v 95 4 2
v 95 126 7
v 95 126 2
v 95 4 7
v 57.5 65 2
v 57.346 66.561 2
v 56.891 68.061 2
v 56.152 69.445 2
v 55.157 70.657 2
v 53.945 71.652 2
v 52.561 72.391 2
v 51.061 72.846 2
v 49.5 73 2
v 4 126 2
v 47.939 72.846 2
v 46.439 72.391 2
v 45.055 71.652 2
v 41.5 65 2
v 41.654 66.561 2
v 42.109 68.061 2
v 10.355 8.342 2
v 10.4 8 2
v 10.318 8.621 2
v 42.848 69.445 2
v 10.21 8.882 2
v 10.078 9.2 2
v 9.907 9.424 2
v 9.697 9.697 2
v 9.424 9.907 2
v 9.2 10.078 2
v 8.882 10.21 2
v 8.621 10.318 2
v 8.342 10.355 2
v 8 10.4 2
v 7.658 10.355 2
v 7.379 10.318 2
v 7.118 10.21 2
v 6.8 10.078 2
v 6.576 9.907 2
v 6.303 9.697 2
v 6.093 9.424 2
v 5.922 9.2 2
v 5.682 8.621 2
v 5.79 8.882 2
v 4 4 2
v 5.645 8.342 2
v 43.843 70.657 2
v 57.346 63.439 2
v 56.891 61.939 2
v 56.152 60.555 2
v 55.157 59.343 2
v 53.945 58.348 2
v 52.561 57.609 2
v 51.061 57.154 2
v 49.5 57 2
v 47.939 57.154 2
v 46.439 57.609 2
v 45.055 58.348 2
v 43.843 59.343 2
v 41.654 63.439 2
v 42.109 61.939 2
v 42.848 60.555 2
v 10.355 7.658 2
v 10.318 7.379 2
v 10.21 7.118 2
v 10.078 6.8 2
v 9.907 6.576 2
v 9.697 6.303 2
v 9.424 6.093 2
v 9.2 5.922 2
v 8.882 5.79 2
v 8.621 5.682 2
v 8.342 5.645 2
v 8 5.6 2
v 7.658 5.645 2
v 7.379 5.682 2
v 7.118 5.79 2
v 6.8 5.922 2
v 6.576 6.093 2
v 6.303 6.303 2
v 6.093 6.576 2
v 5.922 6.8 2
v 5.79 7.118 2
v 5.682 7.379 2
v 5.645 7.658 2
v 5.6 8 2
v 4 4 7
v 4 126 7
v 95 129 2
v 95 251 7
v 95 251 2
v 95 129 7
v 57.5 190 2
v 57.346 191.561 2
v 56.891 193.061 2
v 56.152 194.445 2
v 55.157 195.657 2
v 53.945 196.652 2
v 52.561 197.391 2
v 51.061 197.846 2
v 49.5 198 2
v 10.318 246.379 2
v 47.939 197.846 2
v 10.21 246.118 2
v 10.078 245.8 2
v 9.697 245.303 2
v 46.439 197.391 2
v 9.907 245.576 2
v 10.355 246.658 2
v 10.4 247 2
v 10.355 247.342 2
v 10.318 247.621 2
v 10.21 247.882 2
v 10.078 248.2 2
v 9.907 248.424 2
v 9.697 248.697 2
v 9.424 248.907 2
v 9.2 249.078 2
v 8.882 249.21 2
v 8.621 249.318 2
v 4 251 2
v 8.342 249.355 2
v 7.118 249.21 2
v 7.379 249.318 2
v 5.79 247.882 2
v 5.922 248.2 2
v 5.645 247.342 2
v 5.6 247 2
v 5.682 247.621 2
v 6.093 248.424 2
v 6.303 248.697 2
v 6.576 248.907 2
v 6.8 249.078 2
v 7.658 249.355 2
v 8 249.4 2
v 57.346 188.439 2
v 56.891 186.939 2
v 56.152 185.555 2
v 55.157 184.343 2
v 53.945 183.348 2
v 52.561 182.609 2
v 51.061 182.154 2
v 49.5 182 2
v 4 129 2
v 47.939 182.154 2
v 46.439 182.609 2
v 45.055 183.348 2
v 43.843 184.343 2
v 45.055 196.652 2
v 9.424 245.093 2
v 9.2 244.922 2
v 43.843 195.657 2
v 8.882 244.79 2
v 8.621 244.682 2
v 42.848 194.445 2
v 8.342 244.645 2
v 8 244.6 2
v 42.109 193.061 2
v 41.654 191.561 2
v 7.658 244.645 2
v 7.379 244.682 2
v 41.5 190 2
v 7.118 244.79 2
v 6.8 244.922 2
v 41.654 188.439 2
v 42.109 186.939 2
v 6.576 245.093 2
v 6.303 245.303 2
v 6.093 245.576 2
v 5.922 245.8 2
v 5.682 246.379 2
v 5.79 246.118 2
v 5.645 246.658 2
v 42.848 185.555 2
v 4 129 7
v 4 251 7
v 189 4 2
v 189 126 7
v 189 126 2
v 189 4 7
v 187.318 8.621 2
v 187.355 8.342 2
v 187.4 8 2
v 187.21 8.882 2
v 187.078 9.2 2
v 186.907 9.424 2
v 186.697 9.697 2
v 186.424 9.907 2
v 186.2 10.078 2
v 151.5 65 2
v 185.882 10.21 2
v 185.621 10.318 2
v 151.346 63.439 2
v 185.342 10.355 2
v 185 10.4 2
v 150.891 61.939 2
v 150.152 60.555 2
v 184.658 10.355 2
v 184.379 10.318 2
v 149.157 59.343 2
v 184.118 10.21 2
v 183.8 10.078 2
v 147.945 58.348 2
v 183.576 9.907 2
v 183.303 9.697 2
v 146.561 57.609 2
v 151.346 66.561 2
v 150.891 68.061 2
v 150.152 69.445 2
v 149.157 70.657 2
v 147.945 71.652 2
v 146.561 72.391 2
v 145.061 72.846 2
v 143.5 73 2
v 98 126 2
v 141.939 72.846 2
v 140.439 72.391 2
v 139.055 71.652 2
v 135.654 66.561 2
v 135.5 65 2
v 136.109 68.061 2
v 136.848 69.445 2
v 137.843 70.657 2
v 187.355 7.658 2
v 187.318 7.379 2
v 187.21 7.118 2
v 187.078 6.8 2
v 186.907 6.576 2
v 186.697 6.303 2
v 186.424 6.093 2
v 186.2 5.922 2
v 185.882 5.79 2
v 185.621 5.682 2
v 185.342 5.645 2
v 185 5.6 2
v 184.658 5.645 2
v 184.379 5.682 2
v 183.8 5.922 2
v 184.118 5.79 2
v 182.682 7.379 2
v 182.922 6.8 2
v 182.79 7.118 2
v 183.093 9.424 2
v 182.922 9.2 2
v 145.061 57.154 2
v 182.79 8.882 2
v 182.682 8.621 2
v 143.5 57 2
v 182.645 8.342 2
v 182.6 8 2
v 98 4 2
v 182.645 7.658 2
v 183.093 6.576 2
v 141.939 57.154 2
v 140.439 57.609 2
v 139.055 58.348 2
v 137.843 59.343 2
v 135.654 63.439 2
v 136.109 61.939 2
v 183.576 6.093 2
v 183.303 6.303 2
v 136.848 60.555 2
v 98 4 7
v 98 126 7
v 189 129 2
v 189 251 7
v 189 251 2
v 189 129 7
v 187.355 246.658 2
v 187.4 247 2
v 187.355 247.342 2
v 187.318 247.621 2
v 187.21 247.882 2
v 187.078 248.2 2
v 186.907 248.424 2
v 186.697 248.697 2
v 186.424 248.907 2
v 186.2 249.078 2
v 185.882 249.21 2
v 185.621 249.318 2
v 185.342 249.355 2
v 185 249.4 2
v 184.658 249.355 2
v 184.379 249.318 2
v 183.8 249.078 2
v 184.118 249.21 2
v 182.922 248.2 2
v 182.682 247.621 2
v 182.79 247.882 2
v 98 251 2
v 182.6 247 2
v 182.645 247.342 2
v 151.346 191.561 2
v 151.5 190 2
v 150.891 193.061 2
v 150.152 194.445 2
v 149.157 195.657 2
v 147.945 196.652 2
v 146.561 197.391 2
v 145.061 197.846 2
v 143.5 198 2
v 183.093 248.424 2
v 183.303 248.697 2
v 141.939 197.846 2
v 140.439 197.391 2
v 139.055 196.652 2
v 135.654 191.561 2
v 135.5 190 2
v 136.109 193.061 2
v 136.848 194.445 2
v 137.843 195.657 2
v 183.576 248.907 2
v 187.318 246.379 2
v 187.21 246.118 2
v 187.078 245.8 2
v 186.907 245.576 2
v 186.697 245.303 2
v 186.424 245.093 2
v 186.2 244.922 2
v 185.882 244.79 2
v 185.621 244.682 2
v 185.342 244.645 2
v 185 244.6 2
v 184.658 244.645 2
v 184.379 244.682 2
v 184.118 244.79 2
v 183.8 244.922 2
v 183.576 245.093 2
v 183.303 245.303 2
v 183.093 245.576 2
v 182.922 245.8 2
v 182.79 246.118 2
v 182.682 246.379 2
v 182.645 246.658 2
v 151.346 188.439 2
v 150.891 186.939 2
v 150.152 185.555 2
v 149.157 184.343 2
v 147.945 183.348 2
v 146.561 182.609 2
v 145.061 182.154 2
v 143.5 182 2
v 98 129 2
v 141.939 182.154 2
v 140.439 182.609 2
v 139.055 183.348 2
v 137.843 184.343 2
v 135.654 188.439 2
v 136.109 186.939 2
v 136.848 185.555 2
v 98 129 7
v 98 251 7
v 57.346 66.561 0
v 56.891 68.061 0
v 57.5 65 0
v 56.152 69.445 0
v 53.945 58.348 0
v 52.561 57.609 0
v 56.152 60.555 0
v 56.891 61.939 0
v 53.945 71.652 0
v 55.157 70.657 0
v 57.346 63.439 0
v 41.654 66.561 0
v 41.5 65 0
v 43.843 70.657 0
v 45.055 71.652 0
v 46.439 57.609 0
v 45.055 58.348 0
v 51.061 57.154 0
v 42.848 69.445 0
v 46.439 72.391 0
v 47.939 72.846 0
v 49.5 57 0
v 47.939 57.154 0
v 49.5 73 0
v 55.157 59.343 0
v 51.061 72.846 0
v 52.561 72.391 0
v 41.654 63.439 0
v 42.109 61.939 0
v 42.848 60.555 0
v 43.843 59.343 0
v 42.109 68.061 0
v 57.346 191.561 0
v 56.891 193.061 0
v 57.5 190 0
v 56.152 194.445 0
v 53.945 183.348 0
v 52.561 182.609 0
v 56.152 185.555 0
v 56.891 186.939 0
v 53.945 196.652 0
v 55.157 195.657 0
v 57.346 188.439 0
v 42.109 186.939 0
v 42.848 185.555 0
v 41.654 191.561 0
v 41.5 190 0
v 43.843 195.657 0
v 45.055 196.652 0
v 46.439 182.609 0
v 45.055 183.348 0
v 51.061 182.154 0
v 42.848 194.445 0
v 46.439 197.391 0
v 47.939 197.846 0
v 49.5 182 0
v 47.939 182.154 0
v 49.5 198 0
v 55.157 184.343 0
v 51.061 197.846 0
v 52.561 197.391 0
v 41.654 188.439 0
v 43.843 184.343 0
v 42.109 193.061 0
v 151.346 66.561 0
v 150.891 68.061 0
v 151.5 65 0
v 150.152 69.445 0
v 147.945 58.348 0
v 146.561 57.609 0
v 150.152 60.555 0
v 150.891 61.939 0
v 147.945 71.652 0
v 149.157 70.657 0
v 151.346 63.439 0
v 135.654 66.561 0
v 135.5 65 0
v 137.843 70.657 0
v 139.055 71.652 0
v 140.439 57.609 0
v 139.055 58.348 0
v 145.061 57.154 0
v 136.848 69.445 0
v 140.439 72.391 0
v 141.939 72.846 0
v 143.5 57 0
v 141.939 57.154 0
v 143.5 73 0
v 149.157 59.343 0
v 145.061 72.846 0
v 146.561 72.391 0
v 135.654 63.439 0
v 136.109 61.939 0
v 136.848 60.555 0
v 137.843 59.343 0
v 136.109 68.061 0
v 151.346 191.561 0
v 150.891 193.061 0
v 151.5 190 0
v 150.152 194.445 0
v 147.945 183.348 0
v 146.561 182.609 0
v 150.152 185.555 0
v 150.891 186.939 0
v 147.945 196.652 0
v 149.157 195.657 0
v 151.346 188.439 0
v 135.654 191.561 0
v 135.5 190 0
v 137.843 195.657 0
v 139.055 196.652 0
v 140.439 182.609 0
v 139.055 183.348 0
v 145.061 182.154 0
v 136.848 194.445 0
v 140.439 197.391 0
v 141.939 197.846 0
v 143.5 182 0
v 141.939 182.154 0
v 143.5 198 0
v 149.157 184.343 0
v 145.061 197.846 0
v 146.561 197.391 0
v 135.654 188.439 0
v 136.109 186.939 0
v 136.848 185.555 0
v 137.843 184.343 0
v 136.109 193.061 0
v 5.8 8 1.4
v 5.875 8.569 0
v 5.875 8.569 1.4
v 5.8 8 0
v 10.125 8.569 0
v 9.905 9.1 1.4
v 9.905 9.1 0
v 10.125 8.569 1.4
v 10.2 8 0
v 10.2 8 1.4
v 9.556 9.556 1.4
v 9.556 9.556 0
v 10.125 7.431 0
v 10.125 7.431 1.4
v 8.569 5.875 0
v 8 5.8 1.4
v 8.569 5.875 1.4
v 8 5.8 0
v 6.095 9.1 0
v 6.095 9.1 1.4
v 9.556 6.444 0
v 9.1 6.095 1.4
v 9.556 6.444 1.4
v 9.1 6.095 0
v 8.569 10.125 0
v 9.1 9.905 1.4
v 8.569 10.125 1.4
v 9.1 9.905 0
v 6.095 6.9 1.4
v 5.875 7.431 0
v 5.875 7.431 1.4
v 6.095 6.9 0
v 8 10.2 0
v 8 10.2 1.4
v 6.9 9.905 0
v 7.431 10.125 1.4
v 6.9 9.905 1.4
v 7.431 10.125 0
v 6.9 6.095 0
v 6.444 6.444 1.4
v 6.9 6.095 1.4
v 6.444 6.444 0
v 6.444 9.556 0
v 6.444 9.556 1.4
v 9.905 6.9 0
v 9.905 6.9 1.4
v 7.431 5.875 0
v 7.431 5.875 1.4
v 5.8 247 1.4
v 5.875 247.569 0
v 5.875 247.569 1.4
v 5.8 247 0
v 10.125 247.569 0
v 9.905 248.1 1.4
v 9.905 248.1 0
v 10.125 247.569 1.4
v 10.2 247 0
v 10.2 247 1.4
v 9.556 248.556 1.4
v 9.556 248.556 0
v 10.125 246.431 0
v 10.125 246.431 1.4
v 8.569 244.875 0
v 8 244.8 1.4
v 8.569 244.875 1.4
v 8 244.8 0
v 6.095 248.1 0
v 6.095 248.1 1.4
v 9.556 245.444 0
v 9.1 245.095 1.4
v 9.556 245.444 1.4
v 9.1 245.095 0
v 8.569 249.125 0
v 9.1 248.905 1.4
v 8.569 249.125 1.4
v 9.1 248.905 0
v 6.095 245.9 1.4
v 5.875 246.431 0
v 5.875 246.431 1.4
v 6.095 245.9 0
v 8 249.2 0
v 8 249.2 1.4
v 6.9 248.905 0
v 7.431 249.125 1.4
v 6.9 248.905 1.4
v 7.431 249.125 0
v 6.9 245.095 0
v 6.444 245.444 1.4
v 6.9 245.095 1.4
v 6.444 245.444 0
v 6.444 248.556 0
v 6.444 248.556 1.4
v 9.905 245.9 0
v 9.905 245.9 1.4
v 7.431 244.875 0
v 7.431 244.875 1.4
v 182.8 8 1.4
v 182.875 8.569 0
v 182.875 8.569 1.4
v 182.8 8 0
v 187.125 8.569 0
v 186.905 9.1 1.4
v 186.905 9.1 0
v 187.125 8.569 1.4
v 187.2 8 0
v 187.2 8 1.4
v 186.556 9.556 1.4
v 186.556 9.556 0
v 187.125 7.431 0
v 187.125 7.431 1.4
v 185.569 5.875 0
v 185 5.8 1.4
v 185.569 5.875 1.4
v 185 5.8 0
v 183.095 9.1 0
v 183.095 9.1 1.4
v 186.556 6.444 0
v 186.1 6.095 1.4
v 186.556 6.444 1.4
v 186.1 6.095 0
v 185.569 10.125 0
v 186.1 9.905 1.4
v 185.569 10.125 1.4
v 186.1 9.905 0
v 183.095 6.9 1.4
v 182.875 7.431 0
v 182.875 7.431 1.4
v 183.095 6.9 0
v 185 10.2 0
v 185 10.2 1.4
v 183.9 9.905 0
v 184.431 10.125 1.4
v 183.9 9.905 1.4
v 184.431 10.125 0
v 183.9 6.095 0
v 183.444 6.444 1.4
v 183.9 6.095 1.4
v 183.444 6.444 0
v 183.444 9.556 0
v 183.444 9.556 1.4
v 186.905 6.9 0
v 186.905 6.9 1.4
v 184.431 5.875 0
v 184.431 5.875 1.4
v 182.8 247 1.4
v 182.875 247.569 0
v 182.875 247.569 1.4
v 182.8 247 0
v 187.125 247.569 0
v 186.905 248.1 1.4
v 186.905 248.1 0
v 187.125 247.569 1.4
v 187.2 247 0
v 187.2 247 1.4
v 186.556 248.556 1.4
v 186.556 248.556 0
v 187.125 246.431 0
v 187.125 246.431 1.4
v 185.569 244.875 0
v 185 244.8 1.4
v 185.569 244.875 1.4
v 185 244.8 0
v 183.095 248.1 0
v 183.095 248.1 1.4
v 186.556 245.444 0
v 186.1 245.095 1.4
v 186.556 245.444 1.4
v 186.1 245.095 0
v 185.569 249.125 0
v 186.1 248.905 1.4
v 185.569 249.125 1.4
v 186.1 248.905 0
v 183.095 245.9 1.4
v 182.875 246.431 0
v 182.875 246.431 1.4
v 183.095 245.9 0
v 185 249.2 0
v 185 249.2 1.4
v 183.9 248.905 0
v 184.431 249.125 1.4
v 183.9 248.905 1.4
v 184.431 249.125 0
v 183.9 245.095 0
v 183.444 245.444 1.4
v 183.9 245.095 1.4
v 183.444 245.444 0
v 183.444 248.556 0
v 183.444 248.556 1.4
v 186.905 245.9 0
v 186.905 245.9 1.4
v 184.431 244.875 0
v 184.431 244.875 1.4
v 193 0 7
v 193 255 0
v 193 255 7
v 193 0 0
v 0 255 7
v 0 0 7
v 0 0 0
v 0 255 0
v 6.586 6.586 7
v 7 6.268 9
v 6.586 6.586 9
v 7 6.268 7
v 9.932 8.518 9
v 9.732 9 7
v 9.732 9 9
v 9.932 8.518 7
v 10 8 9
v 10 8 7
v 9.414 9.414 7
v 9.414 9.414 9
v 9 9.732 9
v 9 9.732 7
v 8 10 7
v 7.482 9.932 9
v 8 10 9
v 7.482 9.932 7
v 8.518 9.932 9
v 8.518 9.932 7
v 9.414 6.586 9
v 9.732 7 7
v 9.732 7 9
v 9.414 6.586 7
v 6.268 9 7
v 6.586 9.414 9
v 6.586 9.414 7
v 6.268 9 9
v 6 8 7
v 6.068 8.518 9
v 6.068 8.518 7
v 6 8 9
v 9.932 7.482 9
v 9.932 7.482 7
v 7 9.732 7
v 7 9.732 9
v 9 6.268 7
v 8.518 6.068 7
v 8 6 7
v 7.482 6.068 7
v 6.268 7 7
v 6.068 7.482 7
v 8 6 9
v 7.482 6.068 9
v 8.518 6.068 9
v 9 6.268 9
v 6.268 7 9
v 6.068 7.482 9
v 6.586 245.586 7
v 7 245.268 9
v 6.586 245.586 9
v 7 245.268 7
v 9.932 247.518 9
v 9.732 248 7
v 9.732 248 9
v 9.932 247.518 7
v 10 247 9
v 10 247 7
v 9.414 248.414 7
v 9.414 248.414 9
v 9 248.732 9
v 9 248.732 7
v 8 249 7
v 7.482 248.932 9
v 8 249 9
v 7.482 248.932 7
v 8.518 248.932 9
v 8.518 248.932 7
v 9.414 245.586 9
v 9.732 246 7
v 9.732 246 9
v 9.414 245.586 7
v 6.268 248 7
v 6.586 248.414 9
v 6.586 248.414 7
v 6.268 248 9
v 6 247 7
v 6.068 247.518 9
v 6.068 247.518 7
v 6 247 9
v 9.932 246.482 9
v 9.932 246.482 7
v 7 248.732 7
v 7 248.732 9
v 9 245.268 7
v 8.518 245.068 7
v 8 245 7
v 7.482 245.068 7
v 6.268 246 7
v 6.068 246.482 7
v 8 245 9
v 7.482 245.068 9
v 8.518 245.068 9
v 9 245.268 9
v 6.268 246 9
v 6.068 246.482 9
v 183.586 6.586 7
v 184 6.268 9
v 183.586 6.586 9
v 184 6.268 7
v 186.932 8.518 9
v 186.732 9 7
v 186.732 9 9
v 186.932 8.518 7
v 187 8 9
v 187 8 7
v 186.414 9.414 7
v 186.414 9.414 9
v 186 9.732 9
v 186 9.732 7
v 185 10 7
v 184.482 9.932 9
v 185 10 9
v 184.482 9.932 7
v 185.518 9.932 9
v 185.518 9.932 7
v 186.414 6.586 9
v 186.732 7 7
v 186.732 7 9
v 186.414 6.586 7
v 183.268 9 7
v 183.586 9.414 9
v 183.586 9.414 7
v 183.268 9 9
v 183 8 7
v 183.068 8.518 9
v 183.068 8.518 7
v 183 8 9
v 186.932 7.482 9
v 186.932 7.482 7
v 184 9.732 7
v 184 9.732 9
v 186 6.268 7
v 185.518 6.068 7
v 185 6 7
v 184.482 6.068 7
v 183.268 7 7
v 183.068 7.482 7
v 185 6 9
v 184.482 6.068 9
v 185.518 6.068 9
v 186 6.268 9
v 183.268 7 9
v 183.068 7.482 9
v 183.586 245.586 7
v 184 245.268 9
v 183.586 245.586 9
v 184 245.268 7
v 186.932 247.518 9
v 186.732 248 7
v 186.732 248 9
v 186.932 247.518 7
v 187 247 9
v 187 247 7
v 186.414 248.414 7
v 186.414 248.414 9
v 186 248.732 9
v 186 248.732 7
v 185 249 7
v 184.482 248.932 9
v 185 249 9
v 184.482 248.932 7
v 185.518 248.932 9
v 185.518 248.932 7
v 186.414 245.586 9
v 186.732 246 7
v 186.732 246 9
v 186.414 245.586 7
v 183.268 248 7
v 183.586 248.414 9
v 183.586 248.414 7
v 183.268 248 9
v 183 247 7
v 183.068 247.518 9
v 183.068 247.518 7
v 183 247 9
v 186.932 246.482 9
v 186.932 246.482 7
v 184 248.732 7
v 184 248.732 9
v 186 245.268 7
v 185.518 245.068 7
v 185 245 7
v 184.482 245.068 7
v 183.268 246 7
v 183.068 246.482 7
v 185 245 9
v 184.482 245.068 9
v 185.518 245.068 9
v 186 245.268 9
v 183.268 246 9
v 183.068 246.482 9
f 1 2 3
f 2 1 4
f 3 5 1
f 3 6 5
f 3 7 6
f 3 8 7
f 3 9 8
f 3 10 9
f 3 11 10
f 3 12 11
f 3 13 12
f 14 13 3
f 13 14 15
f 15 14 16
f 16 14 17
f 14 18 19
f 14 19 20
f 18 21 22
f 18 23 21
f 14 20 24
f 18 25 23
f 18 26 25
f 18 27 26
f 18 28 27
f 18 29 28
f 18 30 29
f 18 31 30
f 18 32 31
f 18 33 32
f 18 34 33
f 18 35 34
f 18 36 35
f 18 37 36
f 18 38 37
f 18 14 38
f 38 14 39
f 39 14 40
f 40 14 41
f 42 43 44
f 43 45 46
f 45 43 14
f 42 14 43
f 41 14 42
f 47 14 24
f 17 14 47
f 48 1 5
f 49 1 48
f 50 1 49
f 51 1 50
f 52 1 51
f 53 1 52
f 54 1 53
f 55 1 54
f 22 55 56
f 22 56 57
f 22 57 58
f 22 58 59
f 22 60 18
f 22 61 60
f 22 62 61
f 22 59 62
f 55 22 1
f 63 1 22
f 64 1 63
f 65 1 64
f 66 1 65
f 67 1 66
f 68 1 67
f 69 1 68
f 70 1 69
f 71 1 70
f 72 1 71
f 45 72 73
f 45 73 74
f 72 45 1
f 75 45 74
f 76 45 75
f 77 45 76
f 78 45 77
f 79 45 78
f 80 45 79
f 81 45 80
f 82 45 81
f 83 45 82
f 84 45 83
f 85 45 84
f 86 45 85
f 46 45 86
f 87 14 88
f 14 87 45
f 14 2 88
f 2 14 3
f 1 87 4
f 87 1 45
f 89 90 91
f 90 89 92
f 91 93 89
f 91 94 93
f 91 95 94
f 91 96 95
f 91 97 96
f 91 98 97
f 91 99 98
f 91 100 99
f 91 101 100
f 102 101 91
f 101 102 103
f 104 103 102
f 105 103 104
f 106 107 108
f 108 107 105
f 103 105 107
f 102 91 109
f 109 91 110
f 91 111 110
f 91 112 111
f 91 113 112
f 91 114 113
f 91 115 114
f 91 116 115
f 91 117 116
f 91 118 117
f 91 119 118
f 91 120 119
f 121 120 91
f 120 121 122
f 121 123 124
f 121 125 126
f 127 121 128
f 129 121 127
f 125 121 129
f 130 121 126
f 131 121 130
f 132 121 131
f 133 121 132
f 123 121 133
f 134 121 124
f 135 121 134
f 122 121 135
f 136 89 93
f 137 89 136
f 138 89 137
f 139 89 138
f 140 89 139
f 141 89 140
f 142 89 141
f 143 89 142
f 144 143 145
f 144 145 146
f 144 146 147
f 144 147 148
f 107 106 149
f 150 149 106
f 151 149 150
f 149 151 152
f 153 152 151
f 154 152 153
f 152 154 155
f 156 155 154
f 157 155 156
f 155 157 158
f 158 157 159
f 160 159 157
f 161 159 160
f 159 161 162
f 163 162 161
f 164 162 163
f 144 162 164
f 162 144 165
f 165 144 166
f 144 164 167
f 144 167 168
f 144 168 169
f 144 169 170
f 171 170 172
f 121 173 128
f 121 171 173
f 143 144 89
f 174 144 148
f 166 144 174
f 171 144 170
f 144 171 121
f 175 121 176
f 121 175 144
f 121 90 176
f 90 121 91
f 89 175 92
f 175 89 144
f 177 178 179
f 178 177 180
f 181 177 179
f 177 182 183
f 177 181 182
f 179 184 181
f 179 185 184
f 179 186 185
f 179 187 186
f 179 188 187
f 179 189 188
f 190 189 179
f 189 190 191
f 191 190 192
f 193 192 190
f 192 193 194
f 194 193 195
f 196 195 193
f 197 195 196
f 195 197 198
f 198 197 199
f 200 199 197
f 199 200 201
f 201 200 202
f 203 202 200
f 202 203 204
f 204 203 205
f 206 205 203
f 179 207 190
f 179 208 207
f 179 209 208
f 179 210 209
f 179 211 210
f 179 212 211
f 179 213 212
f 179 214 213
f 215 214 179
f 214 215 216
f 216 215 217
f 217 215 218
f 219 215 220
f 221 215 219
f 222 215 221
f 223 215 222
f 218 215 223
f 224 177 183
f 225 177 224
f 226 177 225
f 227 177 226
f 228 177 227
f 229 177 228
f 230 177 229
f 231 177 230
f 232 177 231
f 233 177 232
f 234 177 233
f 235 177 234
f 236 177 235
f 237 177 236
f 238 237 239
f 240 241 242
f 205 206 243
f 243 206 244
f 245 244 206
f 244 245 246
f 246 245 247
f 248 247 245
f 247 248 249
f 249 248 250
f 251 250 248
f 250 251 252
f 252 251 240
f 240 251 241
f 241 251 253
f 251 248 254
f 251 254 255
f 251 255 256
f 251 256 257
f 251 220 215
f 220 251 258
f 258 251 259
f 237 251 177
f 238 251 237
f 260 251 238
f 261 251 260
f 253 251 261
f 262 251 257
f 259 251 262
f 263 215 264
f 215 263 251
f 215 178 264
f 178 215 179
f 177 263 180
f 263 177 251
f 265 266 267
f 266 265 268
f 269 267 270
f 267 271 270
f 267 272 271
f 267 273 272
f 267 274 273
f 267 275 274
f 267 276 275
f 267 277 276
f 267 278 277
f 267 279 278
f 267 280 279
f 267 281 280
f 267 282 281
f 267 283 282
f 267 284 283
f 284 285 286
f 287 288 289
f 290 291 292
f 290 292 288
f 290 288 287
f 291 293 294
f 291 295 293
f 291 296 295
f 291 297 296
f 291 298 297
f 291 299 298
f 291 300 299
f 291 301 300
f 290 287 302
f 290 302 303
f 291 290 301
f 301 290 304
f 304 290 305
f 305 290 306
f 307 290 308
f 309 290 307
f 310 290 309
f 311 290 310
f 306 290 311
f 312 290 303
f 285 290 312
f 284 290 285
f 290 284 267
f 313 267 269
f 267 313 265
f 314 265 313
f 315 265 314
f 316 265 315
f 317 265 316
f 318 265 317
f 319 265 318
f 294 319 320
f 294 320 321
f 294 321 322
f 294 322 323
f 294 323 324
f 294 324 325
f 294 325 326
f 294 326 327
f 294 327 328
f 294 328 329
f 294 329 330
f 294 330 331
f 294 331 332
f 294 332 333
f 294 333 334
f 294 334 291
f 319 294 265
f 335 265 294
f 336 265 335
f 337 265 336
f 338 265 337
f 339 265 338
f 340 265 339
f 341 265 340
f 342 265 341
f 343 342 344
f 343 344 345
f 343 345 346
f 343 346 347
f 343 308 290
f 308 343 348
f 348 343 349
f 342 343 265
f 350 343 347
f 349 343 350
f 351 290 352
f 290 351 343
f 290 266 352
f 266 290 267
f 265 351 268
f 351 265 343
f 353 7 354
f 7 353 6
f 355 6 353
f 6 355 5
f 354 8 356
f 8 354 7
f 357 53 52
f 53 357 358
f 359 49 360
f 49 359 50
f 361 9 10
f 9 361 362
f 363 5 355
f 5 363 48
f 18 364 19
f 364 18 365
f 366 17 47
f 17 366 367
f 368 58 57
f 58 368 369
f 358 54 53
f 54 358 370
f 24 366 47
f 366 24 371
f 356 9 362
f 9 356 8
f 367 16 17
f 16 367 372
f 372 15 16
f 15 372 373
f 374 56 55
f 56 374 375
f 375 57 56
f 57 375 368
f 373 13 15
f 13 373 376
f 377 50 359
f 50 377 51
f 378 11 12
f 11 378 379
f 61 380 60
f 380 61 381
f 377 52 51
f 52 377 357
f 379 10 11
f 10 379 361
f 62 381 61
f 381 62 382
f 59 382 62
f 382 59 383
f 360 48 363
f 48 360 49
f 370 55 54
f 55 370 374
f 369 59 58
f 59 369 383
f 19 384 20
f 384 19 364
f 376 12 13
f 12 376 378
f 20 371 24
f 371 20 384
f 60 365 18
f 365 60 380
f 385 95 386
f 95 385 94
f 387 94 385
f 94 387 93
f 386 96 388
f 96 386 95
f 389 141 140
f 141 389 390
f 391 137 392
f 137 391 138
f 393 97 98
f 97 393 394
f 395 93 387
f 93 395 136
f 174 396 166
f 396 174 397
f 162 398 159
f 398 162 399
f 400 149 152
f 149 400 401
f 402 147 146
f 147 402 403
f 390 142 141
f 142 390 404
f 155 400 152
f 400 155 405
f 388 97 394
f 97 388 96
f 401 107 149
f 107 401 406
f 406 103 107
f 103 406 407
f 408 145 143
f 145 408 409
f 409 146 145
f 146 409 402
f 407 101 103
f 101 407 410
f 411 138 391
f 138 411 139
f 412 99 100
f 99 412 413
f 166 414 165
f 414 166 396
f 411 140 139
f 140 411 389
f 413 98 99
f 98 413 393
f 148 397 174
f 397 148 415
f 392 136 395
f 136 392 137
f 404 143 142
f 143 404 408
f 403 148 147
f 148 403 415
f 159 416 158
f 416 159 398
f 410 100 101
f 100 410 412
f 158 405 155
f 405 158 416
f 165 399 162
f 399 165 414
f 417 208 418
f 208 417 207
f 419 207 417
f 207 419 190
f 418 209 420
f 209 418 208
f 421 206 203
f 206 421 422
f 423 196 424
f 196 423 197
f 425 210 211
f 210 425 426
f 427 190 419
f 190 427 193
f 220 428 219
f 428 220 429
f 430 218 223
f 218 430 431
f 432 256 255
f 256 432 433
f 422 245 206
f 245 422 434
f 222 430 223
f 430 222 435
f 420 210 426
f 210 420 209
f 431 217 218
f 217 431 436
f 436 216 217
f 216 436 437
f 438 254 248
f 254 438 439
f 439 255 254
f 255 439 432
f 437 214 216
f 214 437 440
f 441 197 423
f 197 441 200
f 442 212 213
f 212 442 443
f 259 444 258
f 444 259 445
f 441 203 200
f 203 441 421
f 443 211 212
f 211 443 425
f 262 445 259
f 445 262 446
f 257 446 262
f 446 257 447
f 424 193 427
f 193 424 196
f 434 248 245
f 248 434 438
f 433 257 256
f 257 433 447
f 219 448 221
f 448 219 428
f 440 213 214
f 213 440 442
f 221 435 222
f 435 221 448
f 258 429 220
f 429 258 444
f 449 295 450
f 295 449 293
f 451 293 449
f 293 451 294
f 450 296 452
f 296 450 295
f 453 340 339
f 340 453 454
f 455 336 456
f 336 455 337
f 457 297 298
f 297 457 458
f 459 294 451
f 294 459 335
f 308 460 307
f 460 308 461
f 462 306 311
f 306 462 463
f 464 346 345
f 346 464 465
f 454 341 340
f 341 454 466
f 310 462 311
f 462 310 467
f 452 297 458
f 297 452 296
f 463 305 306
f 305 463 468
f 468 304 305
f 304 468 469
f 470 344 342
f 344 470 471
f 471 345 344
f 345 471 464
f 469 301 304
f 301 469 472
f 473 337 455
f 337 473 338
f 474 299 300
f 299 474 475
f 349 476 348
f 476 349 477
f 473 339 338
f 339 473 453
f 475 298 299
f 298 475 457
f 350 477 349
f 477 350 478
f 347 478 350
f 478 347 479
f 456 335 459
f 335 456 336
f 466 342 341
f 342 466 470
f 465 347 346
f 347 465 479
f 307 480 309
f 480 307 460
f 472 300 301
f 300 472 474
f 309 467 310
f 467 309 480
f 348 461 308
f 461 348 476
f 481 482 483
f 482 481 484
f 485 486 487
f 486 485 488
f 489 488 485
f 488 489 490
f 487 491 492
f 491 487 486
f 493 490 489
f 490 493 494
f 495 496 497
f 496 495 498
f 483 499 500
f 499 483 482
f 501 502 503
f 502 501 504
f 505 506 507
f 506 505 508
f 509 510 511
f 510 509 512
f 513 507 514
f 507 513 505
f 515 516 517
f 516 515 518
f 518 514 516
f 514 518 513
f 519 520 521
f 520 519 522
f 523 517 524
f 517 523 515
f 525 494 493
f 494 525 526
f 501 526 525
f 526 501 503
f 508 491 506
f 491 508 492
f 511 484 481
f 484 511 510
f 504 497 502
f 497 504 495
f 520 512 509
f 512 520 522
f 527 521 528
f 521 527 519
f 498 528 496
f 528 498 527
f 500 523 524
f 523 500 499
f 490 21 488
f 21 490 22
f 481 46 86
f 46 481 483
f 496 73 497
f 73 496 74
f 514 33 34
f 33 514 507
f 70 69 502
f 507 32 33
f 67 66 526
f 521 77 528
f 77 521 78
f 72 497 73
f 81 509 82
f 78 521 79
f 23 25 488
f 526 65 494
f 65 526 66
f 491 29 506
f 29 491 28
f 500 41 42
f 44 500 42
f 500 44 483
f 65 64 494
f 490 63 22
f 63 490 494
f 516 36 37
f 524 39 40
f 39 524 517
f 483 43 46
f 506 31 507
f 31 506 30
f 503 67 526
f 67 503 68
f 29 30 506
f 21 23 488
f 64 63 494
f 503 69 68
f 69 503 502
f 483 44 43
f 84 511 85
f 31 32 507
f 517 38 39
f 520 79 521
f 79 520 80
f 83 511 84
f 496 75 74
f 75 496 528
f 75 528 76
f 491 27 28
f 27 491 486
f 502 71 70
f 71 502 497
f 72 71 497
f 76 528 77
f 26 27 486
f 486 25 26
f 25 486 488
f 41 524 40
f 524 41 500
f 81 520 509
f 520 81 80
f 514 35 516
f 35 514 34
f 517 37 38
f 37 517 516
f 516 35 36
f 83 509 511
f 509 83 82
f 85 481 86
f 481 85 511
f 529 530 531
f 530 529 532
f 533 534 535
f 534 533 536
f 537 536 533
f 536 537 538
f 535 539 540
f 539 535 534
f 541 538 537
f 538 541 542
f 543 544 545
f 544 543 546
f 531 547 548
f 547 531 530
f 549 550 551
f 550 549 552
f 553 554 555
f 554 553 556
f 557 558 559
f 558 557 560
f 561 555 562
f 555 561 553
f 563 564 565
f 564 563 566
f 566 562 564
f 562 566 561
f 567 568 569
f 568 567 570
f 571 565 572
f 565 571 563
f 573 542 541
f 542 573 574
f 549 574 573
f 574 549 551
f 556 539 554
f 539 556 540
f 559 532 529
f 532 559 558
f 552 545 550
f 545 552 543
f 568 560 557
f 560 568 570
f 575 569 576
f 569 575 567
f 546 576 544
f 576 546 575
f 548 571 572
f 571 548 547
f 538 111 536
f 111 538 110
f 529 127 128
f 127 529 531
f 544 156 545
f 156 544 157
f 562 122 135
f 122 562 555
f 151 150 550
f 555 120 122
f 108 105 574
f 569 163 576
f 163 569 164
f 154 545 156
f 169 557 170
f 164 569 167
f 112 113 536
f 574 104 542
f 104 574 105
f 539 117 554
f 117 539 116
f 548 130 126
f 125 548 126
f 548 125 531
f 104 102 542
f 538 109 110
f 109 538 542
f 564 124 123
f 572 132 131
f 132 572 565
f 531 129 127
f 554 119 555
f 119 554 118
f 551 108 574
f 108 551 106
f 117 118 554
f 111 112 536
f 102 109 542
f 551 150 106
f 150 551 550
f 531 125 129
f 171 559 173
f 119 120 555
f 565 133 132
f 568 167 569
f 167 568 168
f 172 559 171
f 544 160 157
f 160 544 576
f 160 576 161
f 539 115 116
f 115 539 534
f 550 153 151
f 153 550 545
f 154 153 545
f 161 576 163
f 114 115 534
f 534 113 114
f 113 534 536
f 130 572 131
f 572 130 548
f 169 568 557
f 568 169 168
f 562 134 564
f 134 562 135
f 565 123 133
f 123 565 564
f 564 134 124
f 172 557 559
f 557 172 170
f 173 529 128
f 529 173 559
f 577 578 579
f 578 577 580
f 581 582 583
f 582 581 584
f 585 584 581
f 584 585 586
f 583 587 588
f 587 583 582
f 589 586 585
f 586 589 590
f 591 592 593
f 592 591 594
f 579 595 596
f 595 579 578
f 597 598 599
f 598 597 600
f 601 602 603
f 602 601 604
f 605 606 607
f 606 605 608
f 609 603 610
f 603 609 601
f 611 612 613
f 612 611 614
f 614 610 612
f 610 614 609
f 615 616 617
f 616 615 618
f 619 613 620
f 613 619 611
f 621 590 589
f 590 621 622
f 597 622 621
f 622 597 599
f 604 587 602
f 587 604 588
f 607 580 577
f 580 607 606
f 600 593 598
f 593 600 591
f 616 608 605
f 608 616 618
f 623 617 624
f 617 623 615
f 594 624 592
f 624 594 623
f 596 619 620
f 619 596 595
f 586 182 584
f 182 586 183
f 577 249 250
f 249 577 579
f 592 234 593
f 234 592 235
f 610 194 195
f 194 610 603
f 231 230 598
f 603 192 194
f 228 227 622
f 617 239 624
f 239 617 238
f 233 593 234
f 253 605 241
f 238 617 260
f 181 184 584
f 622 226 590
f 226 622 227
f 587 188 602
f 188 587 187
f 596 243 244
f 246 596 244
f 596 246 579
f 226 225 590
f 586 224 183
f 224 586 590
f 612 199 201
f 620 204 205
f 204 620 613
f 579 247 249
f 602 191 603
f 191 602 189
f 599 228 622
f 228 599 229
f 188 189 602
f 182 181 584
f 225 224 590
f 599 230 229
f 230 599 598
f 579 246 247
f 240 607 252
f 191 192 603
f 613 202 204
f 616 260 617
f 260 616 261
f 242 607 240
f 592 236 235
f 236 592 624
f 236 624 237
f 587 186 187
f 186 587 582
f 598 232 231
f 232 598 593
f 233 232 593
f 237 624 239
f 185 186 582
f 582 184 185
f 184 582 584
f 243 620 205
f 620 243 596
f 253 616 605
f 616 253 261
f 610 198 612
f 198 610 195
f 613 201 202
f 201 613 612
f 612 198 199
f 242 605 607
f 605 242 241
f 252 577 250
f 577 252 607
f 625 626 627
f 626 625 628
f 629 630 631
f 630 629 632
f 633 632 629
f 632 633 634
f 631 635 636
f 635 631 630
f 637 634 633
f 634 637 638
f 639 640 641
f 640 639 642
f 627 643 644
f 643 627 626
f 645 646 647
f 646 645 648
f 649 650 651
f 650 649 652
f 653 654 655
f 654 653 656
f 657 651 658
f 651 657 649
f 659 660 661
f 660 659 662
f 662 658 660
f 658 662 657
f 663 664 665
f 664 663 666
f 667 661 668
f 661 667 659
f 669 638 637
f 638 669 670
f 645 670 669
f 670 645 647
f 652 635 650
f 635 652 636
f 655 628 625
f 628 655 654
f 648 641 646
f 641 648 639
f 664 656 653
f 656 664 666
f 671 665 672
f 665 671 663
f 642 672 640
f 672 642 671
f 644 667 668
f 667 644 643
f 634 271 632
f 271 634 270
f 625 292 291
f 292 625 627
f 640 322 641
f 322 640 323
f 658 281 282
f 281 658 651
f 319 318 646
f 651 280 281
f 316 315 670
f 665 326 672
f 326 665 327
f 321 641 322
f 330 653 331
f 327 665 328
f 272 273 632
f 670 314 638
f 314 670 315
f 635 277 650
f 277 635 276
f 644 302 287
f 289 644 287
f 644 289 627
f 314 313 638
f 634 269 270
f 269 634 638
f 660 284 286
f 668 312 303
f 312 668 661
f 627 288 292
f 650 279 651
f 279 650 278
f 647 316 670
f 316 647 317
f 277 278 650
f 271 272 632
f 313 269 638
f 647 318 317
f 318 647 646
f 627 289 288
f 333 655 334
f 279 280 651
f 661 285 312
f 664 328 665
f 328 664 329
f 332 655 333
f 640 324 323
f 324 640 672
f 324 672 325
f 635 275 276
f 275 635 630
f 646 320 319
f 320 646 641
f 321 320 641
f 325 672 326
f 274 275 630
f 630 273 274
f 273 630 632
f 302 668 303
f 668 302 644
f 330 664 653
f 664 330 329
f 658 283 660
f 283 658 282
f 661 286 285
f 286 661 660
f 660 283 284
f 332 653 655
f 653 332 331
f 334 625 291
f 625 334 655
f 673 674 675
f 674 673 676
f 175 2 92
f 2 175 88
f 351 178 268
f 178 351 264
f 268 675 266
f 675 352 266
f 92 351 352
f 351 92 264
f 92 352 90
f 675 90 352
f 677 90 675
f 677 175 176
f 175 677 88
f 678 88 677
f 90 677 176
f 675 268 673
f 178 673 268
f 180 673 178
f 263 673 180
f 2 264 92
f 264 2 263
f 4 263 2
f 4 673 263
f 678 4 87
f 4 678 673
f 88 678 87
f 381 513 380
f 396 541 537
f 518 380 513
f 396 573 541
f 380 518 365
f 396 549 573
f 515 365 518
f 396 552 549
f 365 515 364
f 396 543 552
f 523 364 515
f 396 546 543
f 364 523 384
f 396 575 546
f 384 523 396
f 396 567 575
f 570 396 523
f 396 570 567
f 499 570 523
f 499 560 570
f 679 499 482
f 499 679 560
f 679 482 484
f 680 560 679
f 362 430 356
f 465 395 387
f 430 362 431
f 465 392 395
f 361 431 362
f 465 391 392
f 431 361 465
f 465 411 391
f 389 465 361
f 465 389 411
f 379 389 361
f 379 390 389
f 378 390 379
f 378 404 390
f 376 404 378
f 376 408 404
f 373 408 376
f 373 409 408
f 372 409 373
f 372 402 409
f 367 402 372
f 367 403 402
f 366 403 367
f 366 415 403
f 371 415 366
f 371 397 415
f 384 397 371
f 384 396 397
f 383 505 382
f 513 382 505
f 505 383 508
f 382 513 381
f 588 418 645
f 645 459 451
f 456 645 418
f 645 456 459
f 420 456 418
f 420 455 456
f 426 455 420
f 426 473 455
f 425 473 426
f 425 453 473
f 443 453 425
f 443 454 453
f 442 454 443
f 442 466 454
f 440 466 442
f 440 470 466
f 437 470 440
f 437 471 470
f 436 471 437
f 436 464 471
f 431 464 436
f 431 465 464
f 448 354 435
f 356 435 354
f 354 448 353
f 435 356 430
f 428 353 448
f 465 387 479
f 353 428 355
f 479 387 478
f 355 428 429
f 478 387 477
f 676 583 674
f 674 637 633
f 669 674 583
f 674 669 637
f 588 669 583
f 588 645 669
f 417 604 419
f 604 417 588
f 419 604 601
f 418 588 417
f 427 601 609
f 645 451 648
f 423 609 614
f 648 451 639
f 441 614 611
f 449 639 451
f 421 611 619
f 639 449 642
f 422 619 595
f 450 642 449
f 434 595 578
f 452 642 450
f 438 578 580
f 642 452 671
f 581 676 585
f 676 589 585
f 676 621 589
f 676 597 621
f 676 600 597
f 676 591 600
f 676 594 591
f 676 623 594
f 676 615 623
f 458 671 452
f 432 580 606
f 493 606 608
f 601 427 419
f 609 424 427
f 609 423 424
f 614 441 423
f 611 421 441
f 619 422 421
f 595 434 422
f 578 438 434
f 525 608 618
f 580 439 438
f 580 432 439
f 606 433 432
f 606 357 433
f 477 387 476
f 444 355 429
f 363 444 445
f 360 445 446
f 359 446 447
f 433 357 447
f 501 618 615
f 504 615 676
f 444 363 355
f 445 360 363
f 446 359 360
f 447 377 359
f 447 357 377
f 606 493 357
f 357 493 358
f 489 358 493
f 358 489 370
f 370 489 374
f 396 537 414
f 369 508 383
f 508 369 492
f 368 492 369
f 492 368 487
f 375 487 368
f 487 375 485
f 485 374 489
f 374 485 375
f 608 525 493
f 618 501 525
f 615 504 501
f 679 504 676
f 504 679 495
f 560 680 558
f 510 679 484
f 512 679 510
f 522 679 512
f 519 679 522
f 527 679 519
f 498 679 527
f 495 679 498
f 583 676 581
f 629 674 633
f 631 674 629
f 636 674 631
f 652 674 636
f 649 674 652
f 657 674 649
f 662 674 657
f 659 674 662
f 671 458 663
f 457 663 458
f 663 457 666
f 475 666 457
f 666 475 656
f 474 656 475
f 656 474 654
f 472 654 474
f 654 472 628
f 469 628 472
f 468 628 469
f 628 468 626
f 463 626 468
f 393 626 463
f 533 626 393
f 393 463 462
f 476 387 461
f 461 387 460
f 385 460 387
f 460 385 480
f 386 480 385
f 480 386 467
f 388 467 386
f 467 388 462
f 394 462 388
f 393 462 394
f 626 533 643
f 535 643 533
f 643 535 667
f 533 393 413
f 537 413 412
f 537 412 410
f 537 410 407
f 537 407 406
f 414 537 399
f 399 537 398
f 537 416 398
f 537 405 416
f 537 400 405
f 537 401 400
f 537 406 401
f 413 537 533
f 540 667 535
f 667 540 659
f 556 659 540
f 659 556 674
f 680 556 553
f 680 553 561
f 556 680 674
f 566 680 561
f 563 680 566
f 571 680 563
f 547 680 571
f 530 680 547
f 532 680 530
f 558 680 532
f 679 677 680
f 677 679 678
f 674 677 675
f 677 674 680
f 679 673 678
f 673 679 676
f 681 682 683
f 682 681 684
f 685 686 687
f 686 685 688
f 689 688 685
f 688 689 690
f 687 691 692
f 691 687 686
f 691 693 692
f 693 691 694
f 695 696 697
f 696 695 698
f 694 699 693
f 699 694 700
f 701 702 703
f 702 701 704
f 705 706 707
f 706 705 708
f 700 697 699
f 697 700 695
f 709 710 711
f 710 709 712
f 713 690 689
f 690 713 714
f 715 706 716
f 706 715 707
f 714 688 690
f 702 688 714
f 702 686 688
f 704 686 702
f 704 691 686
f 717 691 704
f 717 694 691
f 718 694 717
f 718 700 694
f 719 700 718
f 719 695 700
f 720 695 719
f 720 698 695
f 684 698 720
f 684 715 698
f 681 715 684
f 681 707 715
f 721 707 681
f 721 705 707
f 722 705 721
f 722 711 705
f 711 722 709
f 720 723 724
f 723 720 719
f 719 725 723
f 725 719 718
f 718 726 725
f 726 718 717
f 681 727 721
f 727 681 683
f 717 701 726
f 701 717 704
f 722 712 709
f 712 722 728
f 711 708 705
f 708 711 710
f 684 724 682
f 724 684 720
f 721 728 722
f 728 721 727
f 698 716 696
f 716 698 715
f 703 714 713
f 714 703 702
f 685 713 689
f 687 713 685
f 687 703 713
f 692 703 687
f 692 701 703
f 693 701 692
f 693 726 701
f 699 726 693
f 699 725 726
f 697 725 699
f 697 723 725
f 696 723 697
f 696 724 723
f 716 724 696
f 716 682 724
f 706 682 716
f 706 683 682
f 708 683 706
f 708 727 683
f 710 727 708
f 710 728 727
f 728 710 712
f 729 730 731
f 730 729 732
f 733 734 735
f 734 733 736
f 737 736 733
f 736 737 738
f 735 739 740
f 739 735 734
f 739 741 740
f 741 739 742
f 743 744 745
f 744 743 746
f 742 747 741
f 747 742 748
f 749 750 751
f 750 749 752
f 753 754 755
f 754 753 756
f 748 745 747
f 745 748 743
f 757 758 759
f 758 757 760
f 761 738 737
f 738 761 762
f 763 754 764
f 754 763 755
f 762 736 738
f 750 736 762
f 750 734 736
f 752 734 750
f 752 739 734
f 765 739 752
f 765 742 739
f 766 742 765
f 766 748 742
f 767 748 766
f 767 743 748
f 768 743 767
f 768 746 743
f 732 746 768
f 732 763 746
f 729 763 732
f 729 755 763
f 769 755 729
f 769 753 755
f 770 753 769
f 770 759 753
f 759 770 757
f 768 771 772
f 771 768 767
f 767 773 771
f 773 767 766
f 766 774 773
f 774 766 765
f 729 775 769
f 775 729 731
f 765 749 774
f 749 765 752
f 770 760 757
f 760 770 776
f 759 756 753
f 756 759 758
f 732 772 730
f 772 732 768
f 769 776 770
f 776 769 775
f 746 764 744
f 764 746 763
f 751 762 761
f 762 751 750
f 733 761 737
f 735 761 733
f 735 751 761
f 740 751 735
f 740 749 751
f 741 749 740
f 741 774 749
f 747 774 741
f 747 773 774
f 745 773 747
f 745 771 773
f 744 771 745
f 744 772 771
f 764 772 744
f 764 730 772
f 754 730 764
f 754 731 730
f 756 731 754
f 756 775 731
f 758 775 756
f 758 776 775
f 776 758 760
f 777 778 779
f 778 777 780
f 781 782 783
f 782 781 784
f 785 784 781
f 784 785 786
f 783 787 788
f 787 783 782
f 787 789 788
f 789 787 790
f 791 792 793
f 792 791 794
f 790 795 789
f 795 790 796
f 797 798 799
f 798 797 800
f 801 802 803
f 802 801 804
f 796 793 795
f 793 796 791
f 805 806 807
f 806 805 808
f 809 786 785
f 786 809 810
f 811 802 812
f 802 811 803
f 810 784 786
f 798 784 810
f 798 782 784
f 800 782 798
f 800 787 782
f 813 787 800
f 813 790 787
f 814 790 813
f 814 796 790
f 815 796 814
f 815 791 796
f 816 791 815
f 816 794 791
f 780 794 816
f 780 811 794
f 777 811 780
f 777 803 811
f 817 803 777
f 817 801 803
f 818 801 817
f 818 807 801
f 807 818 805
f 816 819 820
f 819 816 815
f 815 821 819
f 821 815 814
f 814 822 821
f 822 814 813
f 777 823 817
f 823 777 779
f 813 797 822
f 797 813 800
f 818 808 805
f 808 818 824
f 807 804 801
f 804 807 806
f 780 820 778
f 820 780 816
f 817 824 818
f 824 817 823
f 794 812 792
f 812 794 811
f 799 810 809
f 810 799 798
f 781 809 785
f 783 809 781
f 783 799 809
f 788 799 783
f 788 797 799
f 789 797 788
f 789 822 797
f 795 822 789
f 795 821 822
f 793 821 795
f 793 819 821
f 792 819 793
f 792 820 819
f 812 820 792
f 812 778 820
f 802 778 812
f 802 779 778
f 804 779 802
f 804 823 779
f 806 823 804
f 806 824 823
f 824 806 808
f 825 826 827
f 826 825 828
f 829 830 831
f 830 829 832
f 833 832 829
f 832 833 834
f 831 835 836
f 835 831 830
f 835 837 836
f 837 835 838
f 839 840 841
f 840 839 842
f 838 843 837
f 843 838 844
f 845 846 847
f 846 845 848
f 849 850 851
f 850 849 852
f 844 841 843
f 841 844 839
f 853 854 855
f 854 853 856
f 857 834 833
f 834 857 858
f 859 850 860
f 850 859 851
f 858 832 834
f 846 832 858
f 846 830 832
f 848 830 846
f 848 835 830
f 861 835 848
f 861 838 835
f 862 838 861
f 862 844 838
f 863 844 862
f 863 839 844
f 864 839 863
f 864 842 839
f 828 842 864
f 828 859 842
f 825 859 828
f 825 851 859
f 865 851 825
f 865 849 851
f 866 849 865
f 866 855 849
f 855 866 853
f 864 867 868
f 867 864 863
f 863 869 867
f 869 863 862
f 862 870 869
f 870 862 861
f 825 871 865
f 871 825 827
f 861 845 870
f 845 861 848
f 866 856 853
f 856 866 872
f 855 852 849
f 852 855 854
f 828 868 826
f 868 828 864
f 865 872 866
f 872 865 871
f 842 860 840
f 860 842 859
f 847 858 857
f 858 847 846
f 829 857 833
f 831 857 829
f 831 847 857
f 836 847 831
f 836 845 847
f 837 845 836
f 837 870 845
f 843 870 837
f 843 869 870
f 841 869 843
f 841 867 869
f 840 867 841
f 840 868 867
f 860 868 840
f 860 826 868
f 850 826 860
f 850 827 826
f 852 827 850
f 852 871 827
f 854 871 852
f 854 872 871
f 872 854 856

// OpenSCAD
// pb_slab_tray_v1.scad — PrimeBind PSA Slab Tray Book
// Stackable trays for PSA graded card display and transport
//
// Components:
//   slab_tray()    — standard tray, 2x2 pockets, pegs on top / holes on bottom
//   top_cover()    — flat lid, peg holes on underside
//   bottom_cover() — flat base, peg holes on top face
//
// Print: Matte PLA, flat on bed, no supports needed
// Minitest: scale to 1/3 in slicer before committing to full tray print

// ── Slab dimensions ──────────────────────────────────────────────────────────
// PSA standard holder with 0.5mm clearance per side
SLAB_W  = 91.0;   // holder width  (~90mm)
SLAB_H  = 122.0;  // holder height (~121mm)
SLAB_T  = 5.5;    // actual slab thickness

// ── Layout ───────────────────────────────────────────────────────────────────
COLS = 2;
ROWS = 2;

// ── Structure ─────────────────────────────────────────────────────────────────
WALL_O    = 4.0;   // outer wall thickness
WALL_I    = 3.0;   // wall between adjacent pockets
BASE_T    = 2.0;   // tray floor thickness
POCKET_D  = 5.0;   // pocket depth; slab (5.5mm) sits 0.5mm proud for easy grab
COVER_T   = 4.0;   // top/bottom cover thickness

// ── Alignment pegs ───────────────────────────────────────────────────────────
PEG_D   = 4.0;    // peg diameter
PEG_H   = 2.0;    // peg height above tray top face
PEG_TOL = 0.4;    // diametric clearance for holes
PEG_IN  = 8.0;    // inset from each corner

// ── Thumb-push holes ─────────────────────────────────────────────────────────
PUSH_D  = 16.0;   // diameter; centered in each pocket floor

// ── Derived dimensions ────────────────────────────────────────────────────────
TW = WALL_O*2 + SLAB_W*COLS + WALL_I*(COLS-1);  // 193mm
TH = WALL_O*2 + SLAB_H*ROWS + WALL_I*(ROWS-1);  // 255mm
TD = BASE_T + POCKET_D;                           //   7mm tray body height


// ── Helpers ───────────────────────────────────────────────────────────────────

module at_corners() {
    for (x = [PEG_IN, TW - PEG_IN])
    for (y = [PEG_IN, TH - PEG_IN])
        translate([x, y, 0]) children();
}

module peg() {
    cylinder(h=PEG_H, d=PEG_D, $fn=24);
}

module peg_hole(depth) {
    // slight countersink at opening to guide pegs in
    cylinder(h=depth + 0.1, d=PEG_D + PEG_TOL, $fn=24);
    translate([0, 0, depth - 0.5])
        cylinder(h=1.5, d1=PEG_D + PEG_TOL, d2=PEG_D + PEG_TOL + 1.0, $fn=24);
}

module pocket_origin(col, row) {
    translate([
        WALL_O + col * (SLAB_W + WALL_I),
        WALL_O + row * (SLAB_H + WALL_I),
        0
    ]) children();
}


// ── Slab Tray ─────────────────────────────────────────────────────────────────
module slab_tray() {
    difference() {
        cube([TW, TH, TD]);

        // slab pockets (open at top)
        for (c = [0:COLS-1], r = [0:ROWS-1])
            pocket_origin(c, r)
                translate([0, 0, BASE_T])
                cube([SLAB_W, SLAB_H, POCKET_D + 0.1]);

        // thumb-push holes centered in each pocket floor
        for (c = [0:COLS-1], r = [0:ROWS-1])
            pocket_origin(c, r)
                translate([SLAB_W/2, SLAB_H/2, -0.1])
                cylinder(h=BASE_T + 0.2, d=PUSH_D, $fn=32);

        // alignment holes — bottom face receives pegs from tray below
        at_corners()
            translate([0, 0, -0.1])
            peg_hole(BASE_T);
    }

    // alignment pegs — top face inserts into tray or cover above
    translate([0, 0, TD])
        at_corners()
        peg();
}


// ── Top Cover ─────────────────────────────────────────────────────────────────
// Sits on top of the uppermost tray. Peg holes on underside only.
module top_cover() {
    difference() {
        cube([TW, TH, COVER_T]);
        at_corners()
            translate([0, 0, -0.1])
            peg_hole(COVER_T);
    }
}


// ── Bottom Cover ──────────────────────────────────────────────────────────────
// Base plate. Peg holes on top face receive pegs from the first tray.
// Flat underside — add rubber feet in slicer or glue silicone pads.
module bottom_cover() {
    difference() {
        cube([TW, TH, COVER_T]);
        at_corners()
            translate([0, 0, COVER_T - BASE_T])
            peg_hole(BASE_T + 1);
    }
}


// ── Render ────────────────────────────────────────────────────────────────────
// Uncomment one at a time to export STLs

slab_tray();

// Lay out all parts flat for reference:
// slab_tray();
// translate([TW + 20, 0, 0]) slab_tray();
// translate([0, TH + 20, 0]) top_cover();
// translate([TW + 20, TH + 20, 0]) bottom_cover();
